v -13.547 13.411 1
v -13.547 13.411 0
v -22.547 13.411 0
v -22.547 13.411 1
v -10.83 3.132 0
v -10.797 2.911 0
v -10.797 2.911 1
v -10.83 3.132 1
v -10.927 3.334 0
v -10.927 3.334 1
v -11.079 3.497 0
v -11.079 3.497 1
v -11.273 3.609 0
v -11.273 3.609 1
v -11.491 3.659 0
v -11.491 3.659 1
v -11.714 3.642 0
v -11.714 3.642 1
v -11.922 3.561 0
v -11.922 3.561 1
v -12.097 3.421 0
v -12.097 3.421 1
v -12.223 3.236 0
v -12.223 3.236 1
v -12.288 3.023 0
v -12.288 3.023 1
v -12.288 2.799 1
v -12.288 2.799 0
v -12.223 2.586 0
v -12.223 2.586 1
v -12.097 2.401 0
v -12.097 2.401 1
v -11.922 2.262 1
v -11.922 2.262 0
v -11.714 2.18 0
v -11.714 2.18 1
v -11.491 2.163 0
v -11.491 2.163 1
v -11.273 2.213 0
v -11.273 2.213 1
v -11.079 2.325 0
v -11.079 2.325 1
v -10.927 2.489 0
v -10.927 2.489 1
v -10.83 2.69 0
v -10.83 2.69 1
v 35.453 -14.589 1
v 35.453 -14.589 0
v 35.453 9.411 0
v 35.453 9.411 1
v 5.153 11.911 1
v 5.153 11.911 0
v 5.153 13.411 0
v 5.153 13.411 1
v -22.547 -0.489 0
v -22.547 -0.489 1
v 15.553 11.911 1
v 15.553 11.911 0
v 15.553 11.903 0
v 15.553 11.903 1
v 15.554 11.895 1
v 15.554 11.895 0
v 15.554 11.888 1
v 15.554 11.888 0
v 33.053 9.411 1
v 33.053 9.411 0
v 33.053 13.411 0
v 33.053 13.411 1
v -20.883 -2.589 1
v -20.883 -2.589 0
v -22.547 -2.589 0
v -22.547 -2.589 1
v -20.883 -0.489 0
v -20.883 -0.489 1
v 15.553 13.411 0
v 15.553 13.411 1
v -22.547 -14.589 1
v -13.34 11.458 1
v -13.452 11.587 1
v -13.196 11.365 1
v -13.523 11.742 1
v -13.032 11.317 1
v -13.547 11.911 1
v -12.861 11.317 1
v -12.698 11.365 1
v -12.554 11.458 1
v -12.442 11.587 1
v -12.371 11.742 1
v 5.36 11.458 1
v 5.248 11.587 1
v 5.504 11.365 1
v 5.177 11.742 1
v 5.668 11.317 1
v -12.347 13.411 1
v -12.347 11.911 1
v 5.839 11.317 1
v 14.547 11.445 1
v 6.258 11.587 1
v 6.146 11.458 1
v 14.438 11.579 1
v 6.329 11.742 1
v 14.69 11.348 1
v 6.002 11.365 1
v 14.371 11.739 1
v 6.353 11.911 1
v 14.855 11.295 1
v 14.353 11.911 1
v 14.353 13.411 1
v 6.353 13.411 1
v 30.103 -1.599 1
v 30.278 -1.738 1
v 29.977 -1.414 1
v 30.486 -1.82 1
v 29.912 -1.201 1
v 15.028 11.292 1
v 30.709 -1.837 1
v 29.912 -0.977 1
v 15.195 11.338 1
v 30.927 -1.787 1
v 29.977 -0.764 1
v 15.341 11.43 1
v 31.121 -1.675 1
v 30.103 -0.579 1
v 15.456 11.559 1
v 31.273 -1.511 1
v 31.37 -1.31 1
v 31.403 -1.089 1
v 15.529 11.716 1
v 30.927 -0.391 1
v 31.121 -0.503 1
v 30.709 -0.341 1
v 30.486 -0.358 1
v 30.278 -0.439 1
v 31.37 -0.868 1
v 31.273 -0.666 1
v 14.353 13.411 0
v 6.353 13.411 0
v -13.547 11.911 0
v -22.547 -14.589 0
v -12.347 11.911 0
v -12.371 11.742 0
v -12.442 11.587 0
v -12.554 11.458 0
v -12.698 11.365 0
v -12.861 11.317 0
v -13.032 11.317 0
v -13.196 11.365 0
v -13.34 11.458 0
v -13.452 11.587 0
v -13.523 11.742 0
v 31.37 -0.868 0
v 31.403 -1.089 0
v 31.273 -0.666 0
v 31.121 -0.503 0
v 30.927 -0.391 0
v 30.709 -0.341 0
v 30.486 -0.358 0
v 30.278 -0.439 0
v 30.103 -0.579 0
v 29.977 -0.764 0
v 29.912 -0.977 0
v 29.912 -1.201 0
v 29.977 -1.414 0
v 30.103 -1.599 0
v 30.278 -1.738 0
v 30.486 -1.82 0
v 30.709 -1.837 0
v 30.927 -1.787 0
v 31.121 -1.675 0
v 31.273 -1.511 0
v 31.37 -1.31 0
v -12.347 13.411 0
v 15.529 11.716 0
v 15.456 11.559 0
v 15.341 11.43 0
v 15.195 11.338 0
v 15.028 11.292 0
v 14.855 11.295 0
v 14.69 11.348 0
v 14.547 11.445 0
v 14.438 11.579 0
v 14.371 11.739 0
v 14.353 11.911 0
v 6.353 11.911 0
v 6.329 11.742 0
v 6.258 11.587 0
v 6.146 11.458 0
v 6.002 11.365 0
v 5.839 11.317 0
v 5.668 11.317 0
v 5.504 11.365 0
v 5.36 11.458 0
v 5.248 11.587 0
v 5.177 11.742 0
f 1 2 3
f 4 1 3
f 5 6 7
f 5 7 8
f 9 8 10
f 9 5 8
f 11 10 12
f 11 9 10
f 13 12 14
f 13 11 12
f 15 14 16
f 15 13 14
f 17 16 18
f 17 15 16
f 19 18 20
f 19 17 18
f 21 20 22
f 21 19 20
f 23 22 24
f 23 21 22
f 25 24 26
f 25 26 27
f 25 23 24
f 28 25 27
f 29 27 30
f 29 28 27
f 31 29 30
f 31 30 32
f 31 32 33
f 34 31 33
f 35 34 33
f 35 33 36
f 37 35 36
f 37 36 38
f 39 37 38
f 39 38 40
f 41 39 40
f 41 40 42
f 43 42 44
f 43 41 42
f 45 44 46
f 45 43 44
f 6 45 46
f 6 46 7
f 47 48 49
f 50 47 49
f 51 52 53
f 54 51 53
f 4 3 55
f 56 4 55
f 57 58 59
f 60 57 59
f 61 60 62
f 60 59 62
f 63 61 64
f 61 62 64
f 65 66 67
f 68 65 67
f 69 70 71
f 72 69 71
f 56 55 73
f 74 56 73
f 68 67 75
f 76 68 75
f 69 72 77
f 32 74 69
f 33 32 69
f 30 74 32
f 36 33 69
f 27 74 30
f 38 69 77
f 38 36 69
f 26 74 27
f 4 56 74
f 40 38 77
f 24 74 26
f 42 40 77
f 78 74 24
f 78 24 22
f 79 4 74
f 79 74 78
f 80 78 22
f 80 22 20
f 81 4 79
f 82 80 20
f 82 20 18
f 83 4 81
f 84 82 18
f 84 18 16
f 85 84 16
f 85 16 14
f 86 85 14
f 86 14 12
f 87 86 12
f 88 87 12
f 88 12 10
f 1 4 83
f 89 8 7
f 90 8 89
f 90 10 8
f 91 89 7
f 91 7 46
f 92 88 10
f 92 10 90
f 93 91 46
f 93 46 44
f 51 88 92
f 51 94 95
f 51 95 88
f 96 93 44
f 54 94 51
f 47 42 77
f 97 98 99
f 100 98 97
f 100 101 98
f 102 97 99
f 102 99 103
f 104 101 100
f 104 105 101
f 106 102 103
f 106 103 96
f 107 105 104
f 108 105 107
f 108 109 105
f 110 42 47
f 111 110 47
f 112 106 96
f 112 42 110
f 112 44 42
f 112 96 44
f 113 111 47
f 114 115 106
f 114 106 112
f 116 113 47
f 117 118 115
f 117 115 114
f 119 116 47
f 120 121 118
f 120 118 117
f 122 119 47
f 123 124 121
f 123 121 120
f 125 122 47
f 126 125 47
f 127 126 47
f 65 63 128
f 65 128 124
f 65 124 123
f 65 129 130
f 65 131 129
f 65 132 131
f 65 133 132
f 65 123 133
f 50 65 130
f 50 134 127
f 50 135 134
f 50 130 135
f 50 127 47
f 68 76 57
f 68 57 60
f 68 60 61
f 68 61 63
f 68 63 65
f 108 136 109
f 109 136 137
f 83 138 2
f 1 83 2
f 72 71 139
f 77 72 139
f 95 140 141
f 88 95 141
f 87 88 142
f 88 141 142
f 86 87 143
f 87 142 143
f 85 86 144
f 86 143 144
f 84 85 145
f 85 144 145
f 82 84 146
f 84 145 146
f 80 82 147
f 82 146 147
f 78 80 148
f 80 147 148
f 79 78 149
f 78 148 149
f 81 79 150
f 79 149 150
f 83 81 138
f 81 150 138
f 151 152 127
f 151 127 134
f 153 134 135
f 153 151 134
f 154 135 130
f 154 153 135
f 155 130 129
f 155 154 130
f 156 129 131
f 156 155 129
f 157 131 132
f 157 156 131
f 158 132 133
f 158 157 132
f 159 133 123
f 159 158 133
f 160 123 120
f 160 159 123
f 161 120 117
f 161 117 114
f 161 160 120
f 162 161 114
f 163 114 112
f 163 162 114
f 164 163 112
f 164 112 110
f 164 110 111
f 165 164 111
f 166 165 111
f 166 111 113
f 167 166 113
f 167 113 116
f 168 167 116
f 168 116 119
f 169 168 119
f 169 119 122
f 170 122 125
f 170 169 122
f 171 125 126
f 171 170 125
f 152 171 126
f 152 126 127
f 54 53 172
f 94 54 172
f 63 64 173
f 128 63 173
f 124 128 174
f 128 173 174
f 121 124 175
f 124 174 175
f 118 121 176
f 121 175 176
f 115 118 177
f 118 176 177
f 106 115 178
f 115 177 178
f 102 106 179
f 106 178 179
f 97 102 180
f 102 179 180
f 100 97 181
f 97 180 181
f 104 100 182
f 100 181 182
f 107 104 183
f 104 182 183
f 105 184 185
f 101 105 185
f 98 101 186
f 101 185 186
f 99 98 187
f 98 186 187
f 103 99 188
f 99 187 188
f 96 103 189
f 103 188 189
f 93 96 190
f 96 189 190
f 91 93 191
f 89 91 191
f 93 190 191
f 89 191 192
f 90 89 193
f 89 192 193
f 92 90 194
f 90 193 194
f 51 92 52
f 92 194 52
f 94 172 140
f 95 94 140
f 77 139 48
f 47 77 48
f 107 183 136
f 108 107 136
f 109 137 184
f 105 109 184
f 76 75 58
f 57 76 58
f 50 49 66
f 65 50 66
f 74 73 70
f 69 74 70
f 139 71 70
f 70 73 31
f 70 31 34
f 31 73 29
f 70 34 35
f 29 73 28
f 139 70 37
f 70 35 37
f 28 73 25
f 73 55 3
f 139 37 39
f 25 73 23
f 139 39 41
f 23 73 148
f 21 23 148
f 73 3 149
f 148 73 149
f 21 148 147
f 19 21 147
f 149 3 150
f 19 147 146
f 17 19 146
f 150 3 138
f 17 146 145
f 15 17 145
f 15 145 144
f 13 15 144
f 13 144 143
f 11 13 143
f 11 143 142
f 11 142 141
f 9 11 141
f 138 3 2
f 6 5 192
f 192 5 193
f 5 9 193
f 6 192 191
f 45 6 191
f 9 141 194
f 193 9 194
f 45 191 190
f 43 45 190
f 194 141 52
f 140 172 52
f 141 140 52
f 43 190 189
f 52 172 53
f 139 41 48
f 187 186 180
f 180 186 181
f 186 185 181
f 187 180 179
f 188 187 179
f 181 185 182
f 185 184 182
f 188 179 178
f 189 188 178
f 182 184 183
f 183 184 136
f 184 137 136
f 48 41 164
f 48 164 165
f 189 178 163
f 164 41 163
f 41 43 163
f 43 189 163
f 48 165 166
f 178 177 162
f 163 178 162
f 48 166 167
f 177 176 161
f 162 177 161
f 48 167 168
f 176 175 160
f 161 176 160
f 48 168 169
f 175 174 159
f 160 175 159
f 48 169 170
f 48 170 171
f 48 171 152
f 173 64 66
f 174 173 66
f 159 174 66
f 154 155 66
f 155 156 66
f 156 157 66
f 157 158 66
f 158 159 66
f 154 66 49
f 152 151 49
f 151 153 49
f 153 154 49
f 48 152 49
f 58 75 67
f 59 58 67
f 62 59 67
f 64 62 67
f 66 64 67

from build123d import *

# Parameters (mm, degrees)
SKETCH_1_R      = 0.75
EXTRUDE_1_DEPTH = 1


with BuildPart() as part:
    # Эскиз1 → Бобышка-Вытянуть1 (new body)
    with BuildSketch(Plane.XY):
        with BuildLine():
            Line((-13.546873489, 11.911067194), (-13.546873489, 13.411067194))
            Line((-13.546873489, 13.411067194), (-22.546873489, 13.411067194))
            Line((-22.546873489, 13.411067194), (-22.546873489, -0.488932806))
            Line((-22.546873489, -0.488932806), (-20.883119348, -0.488932806))
            Line((-20.883119348, -0.488932806), (-20.883119348, -2.588932806))
            Line((-20.883119348, -2.588932806), (-22.546873489, -2.588932806))
            Line((-22.546873489, -2.588932806), (-22.546873489, -14.588932806))
            Line((-22.546873489, -14.588932806), (35.453126511, -14.588932806))
            Line((35.453126511, -14.588932806), (35.453126511, 9.411067194))
            Line((35.453126511, 9.411067194), (33.053126511, 9.411067194))
            Line((33.053126511, 9.411067194), (33.053126511, 13.411067194))
            Line((33.053126511, 13.411067194), (15.553126511, 13.411067194))
            Line((15.553126511, 13.411067194), (15.553126511, 11.911067194))
            ThreePointArc((15.553126511, 11.911067194), (15.553472979, 11.899294703), (15.553588483, 11.887517681))
            ThreePointArc((15.553588483, 11.887517681), (14.94134949, 11.287171213), (14.353126511, 11.911067194))
            Line((14.353126511, 11.911067194), (14.353126511, 13.411067194))
            Line((14.353126511, 13.411067194), (6.353126511, 13.411067194))
            Line((6.353126511, 13.411067194), (6.353126511, 11.911067194))
            ThreePointArc((6.353126511, 11.911067194), (5.753126511, 11.311067194), (5.153126511, 11.911067194))
            Line((5.153126511, 11.911067194), (5.153126511, 13.411067194))
            Line((5.153126511, 13.411067194), (-12.346873489, 13.411067194))
            Line((-12.346873489, 13.411067194), (-12.346873489, 11.911067194))
            ThreePointArc((-12.346873489, 11.911067194), (-12.946873489, 11.311067194), (-13.546873489, 11.911067194))
        make_face()
        with Locations((30.653126511, -1.088932806)):
            Circle(SKETCH_1_R, mode=Mode.SUBTRACT)
        with Locations((-11.546873489, 2.911067194)):
            Circle(SKETCH_1_R, mode=Mode.SUBTRACT)
    extrude(amount=EXTRUDE_1_DEPTH)


solid = part.part
